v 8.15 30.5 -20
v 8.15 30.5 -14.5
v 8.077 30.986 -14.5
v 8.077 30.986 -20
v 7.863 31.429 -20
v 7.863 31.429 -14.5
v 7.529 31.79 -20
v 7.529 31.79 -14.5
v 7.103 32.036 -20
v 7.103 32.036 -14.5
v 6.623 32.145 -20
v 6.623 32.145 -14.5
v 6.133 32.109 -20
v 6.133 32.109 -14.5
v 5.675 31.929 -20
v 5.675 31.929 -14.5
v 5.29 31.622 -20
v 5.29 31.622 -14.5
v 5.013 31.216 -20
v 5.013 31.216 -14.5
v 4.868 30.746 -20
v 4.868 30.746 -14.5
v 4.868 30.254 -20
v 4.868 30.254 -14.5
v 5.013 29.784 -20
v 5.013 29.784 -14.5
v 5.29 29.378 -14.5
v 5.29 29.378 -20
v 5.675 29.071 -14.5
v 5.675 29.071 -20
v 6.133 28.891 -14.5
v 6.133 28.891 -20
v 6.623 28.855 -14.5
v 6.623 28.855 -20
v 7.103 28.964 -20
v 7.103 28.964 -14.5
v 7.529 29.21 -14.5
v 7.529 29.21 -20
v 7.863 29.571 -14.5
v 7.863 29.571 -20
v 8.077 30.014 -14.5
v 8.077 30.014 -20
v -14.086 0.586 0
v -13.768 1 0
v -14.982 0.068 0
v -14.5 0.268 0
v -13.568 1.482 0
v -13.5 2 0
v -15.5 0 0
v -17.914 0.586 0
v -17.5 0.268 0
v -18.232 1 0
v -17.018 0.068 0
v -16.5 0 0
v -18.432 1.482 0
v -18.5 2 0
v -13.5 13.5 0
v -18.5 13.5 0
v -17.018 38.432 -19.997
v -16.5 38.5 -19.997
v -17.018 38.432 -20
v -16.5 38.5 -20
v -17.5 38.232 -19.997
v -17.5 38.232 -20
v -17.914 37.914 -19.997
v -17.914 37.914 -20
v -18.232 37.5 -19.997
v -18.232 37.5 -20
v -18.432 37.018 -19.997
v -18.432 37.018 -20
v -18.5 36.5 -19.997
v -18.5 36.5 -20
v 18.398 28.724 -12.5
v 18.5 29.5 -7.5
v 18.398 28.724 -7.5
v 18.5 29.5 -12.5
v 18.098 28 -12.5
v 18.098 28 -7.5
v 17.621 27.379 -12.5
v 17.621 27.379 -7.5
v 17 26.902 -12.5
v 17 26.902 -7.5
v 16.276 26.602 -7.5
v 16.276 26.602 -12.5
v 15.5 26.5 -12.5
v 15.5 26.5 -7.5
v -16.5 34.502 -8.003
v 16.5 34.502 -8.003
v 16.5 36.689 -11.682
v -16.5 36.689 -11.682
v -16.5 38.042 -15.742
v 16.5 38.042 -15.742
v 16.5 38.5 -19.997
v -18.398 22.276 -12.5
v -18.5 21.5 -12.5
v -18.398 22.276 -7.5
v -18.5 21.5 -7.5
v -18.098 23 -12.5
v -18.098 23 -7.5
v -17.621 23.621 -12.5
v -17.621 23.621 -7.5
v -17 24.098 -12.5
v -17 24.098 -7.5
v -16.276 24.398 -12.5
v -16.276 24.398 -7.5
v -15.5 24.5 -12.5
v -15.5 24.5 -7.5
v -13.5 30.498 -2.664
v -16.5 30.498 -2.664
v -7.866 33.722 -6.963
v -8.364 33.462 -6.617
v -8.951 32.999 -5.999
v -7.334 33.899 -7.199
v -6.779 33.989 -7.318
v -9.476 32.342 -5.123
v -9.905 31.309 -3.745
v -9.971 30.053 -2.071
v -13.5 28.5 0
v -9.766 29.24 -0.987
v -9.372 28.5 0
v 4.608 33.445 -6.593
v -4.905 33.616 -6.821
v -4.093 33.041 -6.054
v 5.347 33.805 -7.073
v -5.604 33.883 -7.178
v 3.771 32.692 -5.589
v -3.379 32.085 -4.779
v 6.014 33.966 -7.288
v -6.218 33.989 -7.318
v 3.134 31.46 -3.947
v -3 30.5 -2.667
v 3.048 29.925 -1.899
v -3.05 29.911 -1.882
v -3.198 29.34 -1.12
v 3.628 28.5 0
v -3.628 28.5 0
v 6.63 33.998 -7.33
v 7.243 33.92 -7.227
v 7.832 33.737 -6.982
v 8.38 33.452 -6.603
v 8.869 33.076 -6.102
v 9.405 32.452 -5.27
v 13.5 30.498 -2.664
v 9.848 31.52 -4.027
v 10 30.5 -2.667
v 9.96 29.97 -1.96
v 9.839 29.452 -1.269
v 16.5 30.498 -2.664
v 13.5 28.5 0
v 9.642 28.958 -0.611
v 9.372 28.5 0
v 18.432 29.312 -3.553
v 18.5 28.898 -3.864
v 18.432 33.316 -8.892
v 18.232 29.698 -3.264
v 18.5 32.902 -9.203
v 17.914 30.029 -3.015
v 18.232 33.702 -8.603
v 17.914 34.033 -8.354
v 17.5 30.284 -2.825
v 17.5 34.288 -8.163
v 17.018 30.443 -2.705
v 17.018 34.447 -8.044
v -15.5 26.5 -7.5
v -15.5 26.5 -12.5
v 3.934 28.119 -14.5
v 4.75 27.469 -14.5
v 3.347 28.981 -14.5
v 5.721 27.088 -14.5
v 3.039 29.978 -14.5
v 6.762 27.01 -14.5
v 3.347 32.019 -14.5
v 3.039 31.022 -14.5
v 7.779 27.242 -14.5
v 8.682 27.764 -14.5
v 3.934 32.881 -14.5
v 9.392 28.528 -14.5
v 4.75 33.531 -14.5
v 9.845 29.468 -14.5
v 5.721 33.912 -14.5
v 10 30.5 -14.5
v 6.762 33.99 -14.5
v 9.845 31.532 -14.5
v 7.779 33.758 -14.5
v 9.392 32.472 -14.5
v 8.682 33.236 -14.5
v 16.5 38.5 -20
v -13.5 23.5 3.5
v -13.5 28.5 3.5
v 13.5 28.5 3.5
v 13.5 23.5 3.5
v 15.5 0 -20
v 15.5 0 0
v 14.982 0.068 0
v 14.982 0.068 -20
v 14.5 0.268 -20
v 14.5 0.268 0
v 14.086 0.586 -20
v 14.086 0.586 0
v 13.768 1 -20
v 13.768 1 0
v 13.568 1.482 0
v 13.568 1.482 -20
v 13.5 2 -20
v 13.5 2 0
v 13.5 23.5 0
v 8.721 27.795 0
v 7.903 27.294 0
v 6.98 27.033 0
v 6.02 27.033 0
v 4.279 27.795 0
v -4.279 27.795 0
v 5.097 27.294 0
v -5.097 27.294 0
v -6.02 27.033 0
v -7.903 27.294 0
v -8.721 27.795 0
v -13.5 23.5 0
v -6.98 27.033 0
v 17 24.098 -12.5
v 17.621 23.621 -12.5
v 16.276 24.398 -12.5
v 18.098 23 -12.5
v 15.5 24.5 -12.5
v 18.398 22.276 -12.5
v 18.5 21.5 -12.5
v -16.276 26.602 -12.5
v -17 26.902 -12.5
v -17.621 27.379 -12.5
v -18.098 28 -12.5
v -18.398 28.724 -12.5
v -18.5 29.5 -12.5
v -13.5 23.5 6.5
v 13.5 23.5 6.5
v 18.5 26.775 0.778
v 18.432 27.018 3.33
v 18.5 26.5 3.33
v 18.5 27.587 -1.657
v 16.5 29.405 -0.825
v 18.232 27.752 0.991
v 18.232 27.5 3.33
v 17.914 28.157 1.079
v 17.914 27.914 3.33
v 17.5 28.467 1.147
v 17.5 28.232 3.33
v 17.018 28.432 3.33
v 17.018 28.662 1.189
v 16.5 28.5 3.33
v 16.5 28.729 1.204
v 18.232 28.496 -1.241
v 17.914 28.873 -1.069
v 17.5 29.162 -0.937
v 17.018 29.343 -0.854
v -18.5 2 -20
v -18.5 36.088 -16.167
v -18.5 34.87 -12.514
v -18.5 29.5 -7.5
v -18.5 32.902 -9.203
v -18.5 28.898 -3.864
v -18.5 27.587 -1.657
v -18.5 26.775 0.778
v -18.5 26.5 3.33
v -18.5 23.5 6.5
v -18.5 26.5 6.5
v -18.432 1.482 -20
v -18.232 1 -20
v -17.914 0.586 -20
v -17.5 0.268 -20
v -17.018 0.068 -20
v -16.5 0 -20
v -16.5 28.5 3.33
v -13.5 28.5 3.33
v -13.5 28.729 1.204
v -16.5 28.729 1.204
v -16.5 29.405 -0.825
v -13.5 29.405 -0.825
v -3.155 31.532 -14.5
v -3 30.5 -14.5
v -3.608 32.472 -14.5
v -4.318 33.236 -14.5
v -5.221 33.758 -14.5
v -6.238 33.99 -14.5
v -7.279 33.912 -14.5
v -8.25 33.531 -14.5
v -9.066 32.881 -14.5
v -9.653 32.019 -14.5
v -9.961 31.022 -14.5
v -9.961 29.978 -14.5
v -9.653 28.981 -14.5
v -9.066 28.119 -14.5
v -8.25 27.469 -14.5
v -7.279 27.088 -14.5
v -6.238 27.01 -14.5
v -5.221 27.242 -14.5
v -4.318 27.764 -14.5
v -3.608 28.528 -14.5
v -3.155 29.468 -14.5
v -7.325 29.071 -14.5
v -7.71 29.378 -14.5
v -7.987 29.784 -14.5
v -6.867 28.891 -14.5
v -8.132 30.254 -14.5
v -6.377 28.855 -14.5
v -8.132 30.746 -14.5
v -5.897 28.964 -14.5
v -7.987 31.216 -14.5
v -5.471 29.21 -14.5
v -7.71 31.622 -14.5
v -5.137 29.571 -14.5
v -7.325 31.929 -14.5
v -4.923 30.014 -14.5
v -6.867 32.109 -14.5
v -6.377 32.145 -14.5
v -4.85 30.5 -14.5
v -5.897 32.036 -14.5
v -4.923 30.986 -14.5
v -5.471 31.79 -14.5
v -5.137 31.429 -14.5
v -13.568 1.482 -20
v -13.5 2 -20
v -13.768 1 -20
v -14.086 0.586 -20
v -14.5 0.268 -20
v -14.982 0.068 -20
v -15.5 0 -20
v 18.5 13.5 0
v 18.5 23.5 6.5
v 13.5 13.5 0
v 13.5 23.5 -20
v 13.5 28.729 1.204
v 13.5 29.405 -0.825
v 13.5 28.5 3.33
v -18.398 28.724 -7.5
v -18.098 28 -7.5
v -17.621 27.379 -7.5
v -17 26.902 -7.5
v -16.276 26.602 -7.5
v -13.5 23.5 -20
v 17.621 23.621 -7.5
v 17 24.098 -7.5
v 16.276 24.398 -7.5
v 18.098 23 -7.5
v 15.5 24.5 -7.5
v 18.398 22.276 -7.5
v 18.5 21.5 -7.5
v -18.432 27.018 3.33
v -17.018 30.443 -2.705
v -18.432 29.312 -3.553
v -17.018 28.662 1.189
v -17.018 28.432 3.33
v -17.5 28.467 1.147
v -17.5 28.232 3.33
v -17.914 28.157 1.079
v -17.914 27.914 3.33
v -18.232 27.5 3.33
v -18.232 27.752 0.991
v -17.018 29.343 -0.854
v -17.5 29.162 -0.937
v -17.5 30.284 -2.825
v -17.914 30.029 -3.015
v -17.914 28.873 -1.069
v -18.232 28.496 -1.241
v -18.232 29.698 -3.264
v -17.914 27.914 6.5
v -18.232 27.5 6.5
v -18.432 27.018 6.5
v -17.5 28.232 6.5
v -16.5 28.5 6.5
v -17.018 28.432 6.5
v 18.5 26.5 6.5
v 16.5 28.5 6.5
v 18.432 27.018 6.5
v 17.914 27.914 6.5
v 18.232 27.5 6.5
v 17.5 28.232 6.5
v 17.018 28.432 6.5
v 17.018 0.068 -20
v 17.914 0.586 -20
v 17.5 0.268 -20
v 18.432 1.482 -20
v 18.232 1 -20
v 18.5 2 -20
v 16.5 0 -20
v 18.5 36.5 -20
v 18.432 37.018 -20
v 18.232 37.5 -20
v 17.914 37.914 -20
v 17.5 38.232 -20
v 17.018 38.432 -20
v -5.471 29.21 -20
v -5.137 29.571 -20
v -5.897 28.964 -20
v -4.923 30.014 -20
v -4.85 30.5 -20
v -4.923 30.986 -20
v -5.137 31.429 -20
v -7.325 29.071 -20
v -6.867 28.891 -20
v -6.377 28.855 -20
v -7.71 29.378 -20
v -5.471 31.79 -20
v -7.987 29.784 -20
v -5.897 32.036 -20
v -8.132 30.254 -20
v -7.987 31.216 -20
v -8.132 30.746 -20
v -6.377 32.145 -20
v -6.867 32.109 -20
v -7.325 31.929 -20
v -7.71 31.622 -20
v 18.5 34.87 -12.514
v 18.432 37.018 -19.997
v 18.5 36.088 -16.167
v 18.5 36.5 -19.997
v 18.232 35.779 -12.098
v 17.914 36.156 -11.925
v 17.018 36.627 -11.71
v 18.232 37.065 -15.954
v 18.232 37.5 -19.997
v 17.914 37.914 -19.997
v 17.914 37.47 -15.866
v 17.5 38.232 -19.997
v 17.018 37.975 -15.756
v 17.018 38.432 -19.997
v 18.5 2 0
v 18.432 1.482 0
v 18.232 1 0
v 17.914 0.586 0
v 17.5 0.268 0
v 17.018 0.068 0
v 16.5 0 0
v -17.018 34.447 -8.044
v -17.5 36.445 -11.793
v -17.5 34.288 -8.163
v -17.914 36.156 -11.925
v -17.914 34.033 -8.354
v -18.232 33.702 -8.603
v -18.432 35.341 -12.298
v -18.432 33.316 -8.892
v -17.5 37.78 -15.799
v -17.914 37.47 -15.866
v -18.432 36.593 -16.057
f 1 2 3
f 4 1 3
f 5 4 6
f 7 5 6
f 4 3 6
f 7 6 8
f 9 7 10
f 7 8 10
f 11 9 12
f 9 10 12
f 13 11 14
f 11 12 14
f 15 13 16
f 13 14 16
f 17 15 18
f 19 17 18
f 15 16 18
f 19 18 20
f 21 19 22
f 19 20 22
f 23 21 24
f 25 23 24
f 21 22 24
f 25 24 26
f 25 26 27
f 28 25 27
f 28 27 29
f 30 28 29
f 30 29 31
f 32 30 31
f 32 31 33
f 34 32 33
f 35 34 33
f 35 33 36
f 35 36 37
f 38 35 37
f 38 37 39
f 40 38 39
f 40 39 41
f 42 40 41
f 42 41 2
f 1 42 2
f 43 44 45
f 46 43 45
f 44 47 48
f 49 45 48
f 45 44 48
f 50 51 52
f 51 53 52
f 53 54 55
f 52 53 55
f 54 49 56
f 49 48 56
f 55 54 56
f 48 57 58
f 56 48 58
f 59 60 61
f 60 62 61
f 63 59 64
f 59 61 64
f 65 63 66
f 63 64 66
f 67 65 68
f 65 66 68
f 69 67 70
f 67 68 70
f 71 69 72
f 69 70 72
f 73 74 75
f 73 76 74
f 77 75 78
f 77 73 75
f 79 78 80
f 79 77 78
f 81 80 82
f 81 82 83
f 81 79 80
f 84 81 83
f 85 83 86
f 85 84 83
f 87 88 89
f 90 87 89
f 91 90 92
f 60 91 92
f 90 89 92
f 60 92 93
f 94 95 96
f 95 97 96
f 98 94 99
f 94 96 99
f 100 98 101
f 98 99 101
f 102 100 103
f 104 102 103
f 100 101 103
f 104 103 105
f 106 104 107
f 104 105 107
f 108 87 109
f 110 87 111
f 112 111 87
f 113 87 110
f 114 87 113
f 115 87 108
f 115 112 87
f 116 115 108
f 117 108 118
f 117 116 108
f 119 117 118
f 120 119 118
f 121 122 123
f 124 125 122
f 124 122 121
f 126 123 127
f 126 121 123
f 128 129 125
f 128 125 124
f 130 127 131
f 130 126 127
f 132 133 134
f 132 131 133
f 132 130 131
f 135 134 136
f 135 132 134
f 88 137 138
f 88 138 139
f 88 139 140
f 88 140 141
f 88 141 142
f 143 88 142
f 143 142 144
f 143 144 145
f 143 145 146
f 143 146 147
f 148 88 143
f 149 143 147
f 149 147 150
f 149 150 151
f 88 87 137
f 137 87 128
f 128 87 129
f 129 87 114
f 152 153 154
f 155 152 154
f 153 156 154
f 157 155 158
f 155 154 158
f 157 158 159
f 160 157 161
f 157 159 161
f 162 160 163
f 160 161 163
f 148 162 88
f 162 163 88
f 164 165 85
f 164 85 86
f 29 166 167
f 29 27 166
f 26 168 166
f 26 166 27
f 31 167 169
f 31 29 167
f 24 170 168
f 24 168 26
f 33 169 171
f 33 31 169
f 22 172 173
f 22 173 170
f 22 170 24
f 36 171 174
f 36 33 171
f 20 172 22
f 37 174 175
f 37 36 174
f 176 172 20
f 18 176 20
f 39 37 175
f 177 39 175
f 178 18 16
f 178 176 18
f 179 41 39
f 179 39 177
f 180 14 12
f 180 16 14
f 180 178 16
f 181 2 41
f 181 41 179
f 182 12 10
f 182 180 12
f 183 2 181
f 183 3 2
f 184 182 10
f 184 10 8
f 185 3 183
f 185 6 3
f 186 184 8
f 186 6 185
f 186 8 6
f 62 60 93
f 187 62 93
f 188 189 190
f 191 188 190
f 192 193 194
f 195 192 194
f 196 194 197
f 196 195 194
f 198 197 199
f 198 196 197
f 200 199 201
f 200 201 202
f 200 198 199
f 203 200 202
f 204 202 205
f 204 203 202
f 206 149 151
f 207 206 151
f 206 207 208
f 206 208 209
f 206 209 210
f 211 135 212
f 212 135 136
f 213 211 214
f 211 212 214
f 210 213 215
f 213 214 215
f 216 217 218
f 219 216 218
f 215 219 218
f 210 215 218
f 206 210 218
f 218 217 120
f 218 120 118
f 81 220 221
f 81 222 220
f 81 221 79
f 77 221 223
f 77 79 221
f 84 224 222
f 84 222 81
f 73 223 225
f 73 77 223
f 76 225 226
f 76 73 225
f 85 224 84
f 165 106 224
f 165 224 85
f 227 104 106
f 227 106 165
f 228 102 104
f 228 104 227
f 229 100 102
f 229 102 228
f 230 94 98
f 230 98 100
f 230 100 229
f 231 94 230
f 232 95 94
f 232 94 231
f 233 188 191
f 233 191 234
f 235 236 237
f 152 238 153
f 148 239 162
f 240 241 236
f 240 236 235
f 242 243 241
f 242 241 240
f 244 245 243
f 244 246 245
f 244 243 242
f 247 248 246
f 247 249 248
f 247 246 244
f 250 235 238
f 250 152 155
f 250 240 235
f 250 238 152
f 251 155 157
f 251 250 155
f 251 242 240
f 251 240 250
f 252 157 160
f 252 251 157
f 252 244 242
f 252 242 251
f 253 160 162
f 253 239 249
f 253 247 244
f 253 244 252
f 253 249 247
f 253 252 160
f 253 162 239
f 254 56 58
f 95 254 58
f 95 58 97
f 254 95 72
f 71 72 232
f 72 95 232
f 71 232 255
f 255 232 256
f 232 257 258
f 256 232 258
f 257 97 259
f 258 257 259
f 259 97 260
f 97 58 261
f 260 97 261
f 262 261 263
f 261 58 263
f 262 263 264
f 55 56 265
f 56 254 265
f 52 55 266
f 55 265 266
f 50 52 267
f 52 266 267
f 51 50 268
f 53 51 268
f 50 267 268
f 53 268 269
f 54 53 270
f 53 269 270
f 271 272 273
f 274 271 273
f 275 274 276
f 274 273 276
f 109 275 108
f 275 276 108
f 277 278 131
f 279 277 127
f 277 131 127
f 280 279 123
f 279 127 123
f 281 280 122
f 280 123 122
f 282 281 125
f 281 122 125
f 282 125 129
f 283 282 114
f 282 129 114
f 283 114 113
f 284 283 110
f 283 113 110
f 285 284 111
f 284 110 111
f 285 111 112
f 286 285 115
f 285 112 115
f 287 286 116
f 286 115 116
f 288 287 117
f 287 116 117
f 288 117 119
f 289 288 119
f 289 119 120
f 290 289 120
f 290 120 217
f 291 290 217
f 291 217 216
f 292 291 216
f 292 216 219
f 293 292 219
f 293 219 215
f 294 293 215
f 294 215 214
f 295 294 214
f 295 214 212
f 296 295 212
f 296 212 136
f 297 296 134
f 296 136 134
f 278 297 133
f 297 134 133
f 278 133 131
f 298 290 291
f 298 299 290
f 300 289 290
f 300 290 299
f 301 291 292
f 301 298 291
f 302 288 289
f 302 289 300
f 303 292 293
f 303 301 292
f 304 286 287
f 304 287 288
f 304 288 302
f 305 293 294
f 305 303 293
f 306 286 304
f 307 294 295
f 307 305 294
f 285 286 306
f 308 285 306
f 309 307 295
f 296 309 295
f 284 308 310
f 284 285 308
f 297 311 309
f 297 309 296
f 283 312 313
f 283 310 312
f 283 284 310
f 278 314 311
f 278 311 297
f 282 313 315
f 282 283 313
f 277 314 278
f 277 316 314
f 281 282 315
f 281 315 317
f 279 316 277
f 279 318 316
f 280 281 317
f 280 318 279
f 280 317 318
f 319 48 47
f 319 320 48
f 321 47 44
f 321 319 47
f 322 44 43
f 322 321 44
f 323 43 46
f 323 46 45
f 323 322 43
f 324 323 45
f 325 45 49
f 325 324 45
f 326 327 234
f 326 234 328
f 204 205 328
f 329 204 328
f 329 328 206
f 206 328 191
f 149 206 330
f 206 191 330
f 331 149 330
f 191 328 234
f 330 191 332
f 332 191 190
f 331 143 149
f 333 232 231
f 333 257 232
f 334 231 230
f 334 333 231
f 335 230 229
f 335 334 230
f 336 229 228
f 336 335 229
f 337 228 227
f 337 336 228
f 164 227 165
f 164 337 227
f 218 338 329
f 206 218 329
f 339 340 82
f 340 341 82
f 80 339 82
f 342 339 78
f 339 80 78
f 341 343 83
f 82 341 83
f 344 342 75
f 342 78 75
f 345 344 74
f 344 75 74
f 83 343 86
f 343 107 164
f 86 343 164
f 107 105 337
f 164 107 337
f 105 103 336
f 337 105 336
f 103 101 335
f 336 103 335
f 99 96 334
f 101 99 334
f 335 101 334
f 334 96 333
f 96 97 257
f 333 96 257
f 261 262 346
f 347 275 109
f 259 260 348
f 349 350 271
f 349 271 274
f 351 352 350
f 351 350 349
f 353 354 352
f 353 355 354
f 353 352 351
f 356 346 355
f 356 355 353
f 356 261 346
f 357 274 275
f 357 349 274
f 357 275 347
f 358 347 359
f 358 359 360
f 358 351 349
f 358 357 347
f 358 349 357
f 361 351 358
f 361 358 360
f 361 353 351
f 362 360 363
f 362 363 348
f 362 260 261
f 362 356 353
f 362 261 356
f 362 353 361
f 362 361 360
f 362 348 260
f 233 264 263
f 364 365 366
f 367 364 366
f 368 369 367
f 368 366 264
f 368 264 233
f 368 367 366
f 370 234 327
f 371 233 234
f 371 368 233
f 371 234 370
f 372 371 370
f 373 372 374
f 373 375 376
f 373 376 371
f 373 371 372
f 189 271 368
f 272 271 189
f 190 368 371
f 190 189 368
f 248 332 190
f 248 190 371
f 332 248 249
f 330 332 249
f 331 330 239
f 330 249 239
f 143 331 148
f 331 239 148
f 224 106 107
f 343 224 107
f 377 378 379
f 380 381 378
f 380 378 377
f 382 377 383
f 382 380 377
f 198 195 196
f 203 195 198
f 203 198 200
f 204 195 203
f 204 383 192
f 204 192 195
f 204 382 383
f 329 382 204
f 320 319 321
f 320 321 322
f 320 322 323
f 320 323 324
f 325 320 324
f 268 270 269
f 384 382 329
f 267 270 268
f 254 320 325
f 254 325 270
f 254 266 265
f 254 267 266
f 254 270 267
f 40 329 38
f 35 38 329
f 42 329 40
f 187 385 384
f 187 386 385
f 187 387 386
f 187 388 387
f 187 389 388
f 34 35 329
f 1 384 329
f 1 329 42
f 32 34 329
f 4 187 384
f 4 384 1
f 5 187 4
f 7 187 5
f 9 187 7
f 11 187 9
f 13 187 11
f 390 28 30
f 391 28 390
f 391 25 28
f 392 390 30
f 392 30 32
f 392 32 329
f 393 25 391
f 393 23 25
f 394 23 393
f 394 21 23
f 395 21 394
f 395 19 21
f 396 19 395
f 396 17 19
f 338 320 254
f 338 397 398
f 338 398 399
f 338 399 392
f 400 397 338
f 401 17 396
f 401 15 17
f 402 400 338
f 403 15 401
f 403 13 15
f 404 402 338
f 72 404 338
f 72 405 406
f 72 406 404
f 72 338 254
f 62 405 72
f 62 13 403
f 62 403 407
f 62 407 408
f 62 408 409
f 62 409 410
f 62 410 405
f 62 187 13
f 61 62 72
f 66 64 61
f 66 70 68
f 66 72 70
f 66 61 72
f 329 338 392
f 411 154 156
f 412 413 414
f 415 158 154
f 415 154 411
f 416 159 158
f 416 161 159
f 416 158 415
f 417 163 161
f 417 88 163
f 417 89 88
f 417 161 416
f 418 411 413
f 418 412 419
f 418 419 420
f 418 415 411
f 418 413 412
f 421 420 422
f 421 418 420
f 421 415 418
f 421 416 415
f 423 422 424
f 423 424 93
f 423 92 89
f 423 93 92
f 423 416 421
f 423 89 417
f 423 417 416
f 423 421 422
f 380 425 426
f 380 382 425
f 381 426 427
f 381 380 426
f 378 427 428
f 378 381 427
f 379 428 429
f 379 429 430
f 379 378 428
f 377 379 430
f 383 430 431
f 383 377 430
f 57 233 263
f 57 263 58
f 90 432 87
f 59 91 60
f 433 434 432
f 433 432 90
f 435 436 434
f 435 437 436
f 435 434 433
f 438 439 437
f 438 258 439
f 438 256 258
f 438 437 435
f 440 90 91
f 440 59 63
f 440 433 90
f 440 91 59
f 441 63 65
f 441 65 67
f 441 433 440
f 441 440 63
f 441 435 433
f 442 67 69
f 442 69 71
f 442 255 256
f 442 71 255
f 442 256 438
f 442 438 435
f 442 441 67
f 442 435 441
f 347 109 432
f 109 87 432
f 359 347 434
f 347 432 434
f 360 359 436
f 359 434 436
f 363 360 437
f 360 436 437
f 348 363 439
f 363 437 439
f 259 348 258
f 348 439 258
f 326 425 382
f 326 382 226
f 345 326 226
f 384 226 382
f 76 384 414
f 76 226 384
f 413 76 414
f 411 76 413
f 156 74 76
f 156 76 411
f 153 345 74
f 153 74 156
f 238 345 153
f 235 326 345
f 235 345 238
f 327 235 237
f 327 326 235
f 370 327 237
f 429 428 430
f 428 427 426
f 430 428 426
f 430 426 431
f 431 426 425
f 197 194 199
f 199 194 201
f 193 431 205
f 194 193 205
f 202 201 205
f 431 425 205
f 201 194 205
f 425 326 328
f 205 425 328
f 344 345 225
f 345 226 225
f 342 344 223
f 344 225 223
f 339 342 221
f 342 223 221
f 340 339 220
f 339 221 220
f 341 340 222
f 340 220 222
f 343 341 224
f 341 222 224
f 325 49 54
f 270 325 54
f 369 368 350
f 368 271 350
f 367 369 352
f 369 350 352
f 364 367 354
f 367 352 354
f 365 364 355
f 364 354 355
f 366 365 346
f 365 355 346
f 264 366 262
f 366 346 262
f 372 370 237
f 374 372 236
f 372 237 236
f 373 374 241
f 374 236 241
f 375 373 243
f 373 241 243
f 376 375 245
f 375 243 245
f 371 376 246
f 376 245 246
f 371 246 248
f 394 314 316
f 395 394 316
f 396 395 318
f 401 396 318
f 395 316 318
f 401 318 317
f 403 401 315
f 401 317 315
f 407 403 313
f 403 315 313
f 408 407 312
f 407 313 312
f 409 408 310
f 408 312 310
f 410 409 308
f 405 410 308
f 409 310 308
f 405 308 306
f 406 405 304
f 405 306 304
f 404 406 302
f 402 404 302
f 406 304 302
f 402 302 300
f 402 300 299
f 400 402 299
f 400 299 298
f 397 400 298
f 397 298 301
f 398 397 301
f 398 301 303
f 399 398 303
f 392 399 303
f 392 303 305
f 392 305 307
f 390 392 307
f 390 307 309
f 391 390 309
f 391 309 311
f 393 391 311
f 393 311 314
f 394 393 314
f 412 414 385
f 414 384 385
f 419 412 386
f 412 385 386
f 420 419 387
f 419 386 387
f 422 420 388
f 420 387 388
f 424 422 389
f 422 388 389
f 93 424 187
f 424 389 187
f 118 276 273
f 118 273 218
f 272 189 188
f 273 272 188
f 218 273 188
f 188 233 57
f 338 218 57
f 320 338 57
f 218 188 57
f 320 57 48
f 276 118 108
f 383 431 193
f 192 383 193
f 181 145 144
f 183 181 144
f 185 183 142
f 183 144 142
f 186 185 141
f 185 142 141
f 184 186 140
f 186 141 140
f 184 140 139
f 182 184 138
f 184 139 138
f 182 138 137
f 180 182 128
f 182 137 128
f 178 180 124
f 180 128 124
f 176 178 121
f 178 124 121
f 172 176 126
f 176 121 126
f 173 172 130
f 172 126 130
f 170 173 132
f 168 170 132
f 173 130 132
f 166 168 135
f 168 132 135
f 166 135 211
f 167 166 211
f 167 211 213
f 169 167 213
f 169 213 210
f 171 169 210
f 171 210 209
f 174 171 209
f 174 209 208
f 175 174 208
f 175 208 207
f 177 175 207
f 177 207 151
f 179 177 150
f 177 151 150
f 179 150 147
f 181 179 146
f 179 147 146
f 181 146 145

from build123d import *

# Parameters (mm, degrees)
PAD_DEPTH            = 20
SKETCH001_W          = 37
SKETCH001_H          = 5
PAD001_DEPTH         = 6.5
SKETCH003_W          = 27
SKETCH003_H          = 28.5
POCKET001_DEPTH      = 3.5
SKETCH004_R          = 1.65
POCKET002_DEPTH      = 20.001
SKETCH005_R          = 3.5
POCKET003_DEPTH      = 14.5
POCKET004_DEPTH      = 18.501
POCKET004_DEPTH_BACK = -18.501
PAD002_DEPTH         = 18.5
POCKET_DEPTH         = 13.5
SKETCH008_W          = 2
SKETCH008_H          = 5
POCKET005_DEPTH      = 18.501
POCKET005_DEPTH_BACK = -18.501
FILLET_R             = 3
FILLET001_R          = 9.99
FILLET002_R          = 19.99
FILLET003_R          = 2


with BuildPart() as part:
    # Sketch → Pad (new body)
    with BuildSketch(Plane.XY):
        Polygon((-18.5, 0), (-18.5, 38.5), (18.5, 38.5), (18.5, 0), (13.5, 0), (13.5, 23.5), (-13.5, 23.5), (-13.5, 0), align=None)
    extrude(amount=-PAD_DEPTH)

    # Sketch001 → Pad001 (join)
    with BuildSketch(Plane.XY):
        with Locations((0, 26)):
            Rectangle(SKETCH001_W, SKETCH001_H)
    extrude(amount=PAD001_DEPTH)

    # Sketch003 → Pocket001 (cut)
    with BuildSketch(Plane.XY):
        with Locations((0, 14.25)):
            Rectangle(SKETCH003_W, SKETCH003_H)
    extrude(amount=POCKET001_DEPTH, mode=Mode.SUBTRACT)

    # Sketch004 → Pocket002 (cut, through all)
    with BuildSketch(Plane.XY):
        with Locations((-6.5, 30.5)):
            Circle(SKETCH004_R)
        with Locations((6.5, 30.5)):
            Circle(SKETCH004_R)
    extrude(amount=-POCKET002_DEPTH, mode=Mode.SUBTRACT)

    # Sketch005 → Pocket003 (cut)
    with BuildSketch(Plane.XY):
        with Locations((-6.5, 30.5)):
            Circle(SKETCH005_R)
        with Locations((6.5, 30.5)):
            Circle(SKETCH005_R)
    extrude(amount=-POCKET003_DEPTH, mode=Mode.SUBTRACT)

    # Sketch006 → Pocket004 (cut, two sides)
    with BuildSketch(Plane.YZ) as pocket004_sk:
        Polygon((28.5, 0), (43.5, 0), (43.5, -20), align=None)
    extrude(amount=-POCKET004_DEPTH, mode=Mode.SUBTRACT)
    extrude(pocket004_sk.sketch, amount=-POCKET004_DEPTH_BACK, mode=Mode.SUBTRACT)

    # Sketch007 → Pad002 (join, symmetric)
    with BuildSketch(Plane.YZ):
        Polygon((13.5, 0), (23.5, 0), (23.5, 6.5), align=None)
    extrude(amount=PAD002_DEPTH, both=True)

    # Sketch007 → Pocket (cut, symmetric)
    with BuildSketch(Plane.YZ):
        Polygon((13.5, 0), (23.5, 0), (23.5, 6.5), align=None)
    extrude(amount=POCKET_DEPTH, both=True, mode=Mode.SUBTRACT)

    # Sketch008 → Pocket005 (cut, two sides)
    with BuildSketch(Plane.YZ) as pocket005_sk:
        with Locations((25.5, -10)):
            Rectangle(SKETCH008_W, SKETCH008_H)
    extrude(amount=-POCKET005_DEPTH, mode=Mode.SUBTRACT)
    extrude(pocket005_sk.sketch, amount=-POCKET005_DEPTH_BACK, mode=Mode.SUBTRACT)

    # Fillet
    fillet_edges = [part.edges().sort_by_distance(p)[0] for p in [
        (18.5, 24.5, -10),
        (-18.5, 24.5, -10),
        (18.5, 26.5, -10),
        (-18.5, 26.5, -10),
    ]]
    fillet(fillet_edges, radius=FILLET_R)

    # Fillet001
    fillet001_edges = [part.edges().sort_by_distance(p)[0] for p in [
        (16, 28.5, 0),
        (-16, 28.5, 0),
    ]]
    fillet(fillet001_edges, radius=FILLET001_R)

    # Fillet002
    fillet002_edges = [part.edges().sort_by_distance(p)[0] for p in [
        (0, 38.5, -13.333333),
    ]]
    fillet(fillet002_edges, radius=FILLET002_R)

    # Fillet003
    fillet003_edges = [part.edges().sort_by_distance(p)[0] for p in [
        (18.5, 37.474179, -13.675274),
        (-18.5, 37.474179, -13.675274),
        (18.5, 0, -10),
        (13.5, 0, -10),
        (-13.5, 0, -10),
        (-18.5, 0, -10),
    ]]
    fillet(fillet003_edges, radius=FILLET003_R)


solid = part.part
